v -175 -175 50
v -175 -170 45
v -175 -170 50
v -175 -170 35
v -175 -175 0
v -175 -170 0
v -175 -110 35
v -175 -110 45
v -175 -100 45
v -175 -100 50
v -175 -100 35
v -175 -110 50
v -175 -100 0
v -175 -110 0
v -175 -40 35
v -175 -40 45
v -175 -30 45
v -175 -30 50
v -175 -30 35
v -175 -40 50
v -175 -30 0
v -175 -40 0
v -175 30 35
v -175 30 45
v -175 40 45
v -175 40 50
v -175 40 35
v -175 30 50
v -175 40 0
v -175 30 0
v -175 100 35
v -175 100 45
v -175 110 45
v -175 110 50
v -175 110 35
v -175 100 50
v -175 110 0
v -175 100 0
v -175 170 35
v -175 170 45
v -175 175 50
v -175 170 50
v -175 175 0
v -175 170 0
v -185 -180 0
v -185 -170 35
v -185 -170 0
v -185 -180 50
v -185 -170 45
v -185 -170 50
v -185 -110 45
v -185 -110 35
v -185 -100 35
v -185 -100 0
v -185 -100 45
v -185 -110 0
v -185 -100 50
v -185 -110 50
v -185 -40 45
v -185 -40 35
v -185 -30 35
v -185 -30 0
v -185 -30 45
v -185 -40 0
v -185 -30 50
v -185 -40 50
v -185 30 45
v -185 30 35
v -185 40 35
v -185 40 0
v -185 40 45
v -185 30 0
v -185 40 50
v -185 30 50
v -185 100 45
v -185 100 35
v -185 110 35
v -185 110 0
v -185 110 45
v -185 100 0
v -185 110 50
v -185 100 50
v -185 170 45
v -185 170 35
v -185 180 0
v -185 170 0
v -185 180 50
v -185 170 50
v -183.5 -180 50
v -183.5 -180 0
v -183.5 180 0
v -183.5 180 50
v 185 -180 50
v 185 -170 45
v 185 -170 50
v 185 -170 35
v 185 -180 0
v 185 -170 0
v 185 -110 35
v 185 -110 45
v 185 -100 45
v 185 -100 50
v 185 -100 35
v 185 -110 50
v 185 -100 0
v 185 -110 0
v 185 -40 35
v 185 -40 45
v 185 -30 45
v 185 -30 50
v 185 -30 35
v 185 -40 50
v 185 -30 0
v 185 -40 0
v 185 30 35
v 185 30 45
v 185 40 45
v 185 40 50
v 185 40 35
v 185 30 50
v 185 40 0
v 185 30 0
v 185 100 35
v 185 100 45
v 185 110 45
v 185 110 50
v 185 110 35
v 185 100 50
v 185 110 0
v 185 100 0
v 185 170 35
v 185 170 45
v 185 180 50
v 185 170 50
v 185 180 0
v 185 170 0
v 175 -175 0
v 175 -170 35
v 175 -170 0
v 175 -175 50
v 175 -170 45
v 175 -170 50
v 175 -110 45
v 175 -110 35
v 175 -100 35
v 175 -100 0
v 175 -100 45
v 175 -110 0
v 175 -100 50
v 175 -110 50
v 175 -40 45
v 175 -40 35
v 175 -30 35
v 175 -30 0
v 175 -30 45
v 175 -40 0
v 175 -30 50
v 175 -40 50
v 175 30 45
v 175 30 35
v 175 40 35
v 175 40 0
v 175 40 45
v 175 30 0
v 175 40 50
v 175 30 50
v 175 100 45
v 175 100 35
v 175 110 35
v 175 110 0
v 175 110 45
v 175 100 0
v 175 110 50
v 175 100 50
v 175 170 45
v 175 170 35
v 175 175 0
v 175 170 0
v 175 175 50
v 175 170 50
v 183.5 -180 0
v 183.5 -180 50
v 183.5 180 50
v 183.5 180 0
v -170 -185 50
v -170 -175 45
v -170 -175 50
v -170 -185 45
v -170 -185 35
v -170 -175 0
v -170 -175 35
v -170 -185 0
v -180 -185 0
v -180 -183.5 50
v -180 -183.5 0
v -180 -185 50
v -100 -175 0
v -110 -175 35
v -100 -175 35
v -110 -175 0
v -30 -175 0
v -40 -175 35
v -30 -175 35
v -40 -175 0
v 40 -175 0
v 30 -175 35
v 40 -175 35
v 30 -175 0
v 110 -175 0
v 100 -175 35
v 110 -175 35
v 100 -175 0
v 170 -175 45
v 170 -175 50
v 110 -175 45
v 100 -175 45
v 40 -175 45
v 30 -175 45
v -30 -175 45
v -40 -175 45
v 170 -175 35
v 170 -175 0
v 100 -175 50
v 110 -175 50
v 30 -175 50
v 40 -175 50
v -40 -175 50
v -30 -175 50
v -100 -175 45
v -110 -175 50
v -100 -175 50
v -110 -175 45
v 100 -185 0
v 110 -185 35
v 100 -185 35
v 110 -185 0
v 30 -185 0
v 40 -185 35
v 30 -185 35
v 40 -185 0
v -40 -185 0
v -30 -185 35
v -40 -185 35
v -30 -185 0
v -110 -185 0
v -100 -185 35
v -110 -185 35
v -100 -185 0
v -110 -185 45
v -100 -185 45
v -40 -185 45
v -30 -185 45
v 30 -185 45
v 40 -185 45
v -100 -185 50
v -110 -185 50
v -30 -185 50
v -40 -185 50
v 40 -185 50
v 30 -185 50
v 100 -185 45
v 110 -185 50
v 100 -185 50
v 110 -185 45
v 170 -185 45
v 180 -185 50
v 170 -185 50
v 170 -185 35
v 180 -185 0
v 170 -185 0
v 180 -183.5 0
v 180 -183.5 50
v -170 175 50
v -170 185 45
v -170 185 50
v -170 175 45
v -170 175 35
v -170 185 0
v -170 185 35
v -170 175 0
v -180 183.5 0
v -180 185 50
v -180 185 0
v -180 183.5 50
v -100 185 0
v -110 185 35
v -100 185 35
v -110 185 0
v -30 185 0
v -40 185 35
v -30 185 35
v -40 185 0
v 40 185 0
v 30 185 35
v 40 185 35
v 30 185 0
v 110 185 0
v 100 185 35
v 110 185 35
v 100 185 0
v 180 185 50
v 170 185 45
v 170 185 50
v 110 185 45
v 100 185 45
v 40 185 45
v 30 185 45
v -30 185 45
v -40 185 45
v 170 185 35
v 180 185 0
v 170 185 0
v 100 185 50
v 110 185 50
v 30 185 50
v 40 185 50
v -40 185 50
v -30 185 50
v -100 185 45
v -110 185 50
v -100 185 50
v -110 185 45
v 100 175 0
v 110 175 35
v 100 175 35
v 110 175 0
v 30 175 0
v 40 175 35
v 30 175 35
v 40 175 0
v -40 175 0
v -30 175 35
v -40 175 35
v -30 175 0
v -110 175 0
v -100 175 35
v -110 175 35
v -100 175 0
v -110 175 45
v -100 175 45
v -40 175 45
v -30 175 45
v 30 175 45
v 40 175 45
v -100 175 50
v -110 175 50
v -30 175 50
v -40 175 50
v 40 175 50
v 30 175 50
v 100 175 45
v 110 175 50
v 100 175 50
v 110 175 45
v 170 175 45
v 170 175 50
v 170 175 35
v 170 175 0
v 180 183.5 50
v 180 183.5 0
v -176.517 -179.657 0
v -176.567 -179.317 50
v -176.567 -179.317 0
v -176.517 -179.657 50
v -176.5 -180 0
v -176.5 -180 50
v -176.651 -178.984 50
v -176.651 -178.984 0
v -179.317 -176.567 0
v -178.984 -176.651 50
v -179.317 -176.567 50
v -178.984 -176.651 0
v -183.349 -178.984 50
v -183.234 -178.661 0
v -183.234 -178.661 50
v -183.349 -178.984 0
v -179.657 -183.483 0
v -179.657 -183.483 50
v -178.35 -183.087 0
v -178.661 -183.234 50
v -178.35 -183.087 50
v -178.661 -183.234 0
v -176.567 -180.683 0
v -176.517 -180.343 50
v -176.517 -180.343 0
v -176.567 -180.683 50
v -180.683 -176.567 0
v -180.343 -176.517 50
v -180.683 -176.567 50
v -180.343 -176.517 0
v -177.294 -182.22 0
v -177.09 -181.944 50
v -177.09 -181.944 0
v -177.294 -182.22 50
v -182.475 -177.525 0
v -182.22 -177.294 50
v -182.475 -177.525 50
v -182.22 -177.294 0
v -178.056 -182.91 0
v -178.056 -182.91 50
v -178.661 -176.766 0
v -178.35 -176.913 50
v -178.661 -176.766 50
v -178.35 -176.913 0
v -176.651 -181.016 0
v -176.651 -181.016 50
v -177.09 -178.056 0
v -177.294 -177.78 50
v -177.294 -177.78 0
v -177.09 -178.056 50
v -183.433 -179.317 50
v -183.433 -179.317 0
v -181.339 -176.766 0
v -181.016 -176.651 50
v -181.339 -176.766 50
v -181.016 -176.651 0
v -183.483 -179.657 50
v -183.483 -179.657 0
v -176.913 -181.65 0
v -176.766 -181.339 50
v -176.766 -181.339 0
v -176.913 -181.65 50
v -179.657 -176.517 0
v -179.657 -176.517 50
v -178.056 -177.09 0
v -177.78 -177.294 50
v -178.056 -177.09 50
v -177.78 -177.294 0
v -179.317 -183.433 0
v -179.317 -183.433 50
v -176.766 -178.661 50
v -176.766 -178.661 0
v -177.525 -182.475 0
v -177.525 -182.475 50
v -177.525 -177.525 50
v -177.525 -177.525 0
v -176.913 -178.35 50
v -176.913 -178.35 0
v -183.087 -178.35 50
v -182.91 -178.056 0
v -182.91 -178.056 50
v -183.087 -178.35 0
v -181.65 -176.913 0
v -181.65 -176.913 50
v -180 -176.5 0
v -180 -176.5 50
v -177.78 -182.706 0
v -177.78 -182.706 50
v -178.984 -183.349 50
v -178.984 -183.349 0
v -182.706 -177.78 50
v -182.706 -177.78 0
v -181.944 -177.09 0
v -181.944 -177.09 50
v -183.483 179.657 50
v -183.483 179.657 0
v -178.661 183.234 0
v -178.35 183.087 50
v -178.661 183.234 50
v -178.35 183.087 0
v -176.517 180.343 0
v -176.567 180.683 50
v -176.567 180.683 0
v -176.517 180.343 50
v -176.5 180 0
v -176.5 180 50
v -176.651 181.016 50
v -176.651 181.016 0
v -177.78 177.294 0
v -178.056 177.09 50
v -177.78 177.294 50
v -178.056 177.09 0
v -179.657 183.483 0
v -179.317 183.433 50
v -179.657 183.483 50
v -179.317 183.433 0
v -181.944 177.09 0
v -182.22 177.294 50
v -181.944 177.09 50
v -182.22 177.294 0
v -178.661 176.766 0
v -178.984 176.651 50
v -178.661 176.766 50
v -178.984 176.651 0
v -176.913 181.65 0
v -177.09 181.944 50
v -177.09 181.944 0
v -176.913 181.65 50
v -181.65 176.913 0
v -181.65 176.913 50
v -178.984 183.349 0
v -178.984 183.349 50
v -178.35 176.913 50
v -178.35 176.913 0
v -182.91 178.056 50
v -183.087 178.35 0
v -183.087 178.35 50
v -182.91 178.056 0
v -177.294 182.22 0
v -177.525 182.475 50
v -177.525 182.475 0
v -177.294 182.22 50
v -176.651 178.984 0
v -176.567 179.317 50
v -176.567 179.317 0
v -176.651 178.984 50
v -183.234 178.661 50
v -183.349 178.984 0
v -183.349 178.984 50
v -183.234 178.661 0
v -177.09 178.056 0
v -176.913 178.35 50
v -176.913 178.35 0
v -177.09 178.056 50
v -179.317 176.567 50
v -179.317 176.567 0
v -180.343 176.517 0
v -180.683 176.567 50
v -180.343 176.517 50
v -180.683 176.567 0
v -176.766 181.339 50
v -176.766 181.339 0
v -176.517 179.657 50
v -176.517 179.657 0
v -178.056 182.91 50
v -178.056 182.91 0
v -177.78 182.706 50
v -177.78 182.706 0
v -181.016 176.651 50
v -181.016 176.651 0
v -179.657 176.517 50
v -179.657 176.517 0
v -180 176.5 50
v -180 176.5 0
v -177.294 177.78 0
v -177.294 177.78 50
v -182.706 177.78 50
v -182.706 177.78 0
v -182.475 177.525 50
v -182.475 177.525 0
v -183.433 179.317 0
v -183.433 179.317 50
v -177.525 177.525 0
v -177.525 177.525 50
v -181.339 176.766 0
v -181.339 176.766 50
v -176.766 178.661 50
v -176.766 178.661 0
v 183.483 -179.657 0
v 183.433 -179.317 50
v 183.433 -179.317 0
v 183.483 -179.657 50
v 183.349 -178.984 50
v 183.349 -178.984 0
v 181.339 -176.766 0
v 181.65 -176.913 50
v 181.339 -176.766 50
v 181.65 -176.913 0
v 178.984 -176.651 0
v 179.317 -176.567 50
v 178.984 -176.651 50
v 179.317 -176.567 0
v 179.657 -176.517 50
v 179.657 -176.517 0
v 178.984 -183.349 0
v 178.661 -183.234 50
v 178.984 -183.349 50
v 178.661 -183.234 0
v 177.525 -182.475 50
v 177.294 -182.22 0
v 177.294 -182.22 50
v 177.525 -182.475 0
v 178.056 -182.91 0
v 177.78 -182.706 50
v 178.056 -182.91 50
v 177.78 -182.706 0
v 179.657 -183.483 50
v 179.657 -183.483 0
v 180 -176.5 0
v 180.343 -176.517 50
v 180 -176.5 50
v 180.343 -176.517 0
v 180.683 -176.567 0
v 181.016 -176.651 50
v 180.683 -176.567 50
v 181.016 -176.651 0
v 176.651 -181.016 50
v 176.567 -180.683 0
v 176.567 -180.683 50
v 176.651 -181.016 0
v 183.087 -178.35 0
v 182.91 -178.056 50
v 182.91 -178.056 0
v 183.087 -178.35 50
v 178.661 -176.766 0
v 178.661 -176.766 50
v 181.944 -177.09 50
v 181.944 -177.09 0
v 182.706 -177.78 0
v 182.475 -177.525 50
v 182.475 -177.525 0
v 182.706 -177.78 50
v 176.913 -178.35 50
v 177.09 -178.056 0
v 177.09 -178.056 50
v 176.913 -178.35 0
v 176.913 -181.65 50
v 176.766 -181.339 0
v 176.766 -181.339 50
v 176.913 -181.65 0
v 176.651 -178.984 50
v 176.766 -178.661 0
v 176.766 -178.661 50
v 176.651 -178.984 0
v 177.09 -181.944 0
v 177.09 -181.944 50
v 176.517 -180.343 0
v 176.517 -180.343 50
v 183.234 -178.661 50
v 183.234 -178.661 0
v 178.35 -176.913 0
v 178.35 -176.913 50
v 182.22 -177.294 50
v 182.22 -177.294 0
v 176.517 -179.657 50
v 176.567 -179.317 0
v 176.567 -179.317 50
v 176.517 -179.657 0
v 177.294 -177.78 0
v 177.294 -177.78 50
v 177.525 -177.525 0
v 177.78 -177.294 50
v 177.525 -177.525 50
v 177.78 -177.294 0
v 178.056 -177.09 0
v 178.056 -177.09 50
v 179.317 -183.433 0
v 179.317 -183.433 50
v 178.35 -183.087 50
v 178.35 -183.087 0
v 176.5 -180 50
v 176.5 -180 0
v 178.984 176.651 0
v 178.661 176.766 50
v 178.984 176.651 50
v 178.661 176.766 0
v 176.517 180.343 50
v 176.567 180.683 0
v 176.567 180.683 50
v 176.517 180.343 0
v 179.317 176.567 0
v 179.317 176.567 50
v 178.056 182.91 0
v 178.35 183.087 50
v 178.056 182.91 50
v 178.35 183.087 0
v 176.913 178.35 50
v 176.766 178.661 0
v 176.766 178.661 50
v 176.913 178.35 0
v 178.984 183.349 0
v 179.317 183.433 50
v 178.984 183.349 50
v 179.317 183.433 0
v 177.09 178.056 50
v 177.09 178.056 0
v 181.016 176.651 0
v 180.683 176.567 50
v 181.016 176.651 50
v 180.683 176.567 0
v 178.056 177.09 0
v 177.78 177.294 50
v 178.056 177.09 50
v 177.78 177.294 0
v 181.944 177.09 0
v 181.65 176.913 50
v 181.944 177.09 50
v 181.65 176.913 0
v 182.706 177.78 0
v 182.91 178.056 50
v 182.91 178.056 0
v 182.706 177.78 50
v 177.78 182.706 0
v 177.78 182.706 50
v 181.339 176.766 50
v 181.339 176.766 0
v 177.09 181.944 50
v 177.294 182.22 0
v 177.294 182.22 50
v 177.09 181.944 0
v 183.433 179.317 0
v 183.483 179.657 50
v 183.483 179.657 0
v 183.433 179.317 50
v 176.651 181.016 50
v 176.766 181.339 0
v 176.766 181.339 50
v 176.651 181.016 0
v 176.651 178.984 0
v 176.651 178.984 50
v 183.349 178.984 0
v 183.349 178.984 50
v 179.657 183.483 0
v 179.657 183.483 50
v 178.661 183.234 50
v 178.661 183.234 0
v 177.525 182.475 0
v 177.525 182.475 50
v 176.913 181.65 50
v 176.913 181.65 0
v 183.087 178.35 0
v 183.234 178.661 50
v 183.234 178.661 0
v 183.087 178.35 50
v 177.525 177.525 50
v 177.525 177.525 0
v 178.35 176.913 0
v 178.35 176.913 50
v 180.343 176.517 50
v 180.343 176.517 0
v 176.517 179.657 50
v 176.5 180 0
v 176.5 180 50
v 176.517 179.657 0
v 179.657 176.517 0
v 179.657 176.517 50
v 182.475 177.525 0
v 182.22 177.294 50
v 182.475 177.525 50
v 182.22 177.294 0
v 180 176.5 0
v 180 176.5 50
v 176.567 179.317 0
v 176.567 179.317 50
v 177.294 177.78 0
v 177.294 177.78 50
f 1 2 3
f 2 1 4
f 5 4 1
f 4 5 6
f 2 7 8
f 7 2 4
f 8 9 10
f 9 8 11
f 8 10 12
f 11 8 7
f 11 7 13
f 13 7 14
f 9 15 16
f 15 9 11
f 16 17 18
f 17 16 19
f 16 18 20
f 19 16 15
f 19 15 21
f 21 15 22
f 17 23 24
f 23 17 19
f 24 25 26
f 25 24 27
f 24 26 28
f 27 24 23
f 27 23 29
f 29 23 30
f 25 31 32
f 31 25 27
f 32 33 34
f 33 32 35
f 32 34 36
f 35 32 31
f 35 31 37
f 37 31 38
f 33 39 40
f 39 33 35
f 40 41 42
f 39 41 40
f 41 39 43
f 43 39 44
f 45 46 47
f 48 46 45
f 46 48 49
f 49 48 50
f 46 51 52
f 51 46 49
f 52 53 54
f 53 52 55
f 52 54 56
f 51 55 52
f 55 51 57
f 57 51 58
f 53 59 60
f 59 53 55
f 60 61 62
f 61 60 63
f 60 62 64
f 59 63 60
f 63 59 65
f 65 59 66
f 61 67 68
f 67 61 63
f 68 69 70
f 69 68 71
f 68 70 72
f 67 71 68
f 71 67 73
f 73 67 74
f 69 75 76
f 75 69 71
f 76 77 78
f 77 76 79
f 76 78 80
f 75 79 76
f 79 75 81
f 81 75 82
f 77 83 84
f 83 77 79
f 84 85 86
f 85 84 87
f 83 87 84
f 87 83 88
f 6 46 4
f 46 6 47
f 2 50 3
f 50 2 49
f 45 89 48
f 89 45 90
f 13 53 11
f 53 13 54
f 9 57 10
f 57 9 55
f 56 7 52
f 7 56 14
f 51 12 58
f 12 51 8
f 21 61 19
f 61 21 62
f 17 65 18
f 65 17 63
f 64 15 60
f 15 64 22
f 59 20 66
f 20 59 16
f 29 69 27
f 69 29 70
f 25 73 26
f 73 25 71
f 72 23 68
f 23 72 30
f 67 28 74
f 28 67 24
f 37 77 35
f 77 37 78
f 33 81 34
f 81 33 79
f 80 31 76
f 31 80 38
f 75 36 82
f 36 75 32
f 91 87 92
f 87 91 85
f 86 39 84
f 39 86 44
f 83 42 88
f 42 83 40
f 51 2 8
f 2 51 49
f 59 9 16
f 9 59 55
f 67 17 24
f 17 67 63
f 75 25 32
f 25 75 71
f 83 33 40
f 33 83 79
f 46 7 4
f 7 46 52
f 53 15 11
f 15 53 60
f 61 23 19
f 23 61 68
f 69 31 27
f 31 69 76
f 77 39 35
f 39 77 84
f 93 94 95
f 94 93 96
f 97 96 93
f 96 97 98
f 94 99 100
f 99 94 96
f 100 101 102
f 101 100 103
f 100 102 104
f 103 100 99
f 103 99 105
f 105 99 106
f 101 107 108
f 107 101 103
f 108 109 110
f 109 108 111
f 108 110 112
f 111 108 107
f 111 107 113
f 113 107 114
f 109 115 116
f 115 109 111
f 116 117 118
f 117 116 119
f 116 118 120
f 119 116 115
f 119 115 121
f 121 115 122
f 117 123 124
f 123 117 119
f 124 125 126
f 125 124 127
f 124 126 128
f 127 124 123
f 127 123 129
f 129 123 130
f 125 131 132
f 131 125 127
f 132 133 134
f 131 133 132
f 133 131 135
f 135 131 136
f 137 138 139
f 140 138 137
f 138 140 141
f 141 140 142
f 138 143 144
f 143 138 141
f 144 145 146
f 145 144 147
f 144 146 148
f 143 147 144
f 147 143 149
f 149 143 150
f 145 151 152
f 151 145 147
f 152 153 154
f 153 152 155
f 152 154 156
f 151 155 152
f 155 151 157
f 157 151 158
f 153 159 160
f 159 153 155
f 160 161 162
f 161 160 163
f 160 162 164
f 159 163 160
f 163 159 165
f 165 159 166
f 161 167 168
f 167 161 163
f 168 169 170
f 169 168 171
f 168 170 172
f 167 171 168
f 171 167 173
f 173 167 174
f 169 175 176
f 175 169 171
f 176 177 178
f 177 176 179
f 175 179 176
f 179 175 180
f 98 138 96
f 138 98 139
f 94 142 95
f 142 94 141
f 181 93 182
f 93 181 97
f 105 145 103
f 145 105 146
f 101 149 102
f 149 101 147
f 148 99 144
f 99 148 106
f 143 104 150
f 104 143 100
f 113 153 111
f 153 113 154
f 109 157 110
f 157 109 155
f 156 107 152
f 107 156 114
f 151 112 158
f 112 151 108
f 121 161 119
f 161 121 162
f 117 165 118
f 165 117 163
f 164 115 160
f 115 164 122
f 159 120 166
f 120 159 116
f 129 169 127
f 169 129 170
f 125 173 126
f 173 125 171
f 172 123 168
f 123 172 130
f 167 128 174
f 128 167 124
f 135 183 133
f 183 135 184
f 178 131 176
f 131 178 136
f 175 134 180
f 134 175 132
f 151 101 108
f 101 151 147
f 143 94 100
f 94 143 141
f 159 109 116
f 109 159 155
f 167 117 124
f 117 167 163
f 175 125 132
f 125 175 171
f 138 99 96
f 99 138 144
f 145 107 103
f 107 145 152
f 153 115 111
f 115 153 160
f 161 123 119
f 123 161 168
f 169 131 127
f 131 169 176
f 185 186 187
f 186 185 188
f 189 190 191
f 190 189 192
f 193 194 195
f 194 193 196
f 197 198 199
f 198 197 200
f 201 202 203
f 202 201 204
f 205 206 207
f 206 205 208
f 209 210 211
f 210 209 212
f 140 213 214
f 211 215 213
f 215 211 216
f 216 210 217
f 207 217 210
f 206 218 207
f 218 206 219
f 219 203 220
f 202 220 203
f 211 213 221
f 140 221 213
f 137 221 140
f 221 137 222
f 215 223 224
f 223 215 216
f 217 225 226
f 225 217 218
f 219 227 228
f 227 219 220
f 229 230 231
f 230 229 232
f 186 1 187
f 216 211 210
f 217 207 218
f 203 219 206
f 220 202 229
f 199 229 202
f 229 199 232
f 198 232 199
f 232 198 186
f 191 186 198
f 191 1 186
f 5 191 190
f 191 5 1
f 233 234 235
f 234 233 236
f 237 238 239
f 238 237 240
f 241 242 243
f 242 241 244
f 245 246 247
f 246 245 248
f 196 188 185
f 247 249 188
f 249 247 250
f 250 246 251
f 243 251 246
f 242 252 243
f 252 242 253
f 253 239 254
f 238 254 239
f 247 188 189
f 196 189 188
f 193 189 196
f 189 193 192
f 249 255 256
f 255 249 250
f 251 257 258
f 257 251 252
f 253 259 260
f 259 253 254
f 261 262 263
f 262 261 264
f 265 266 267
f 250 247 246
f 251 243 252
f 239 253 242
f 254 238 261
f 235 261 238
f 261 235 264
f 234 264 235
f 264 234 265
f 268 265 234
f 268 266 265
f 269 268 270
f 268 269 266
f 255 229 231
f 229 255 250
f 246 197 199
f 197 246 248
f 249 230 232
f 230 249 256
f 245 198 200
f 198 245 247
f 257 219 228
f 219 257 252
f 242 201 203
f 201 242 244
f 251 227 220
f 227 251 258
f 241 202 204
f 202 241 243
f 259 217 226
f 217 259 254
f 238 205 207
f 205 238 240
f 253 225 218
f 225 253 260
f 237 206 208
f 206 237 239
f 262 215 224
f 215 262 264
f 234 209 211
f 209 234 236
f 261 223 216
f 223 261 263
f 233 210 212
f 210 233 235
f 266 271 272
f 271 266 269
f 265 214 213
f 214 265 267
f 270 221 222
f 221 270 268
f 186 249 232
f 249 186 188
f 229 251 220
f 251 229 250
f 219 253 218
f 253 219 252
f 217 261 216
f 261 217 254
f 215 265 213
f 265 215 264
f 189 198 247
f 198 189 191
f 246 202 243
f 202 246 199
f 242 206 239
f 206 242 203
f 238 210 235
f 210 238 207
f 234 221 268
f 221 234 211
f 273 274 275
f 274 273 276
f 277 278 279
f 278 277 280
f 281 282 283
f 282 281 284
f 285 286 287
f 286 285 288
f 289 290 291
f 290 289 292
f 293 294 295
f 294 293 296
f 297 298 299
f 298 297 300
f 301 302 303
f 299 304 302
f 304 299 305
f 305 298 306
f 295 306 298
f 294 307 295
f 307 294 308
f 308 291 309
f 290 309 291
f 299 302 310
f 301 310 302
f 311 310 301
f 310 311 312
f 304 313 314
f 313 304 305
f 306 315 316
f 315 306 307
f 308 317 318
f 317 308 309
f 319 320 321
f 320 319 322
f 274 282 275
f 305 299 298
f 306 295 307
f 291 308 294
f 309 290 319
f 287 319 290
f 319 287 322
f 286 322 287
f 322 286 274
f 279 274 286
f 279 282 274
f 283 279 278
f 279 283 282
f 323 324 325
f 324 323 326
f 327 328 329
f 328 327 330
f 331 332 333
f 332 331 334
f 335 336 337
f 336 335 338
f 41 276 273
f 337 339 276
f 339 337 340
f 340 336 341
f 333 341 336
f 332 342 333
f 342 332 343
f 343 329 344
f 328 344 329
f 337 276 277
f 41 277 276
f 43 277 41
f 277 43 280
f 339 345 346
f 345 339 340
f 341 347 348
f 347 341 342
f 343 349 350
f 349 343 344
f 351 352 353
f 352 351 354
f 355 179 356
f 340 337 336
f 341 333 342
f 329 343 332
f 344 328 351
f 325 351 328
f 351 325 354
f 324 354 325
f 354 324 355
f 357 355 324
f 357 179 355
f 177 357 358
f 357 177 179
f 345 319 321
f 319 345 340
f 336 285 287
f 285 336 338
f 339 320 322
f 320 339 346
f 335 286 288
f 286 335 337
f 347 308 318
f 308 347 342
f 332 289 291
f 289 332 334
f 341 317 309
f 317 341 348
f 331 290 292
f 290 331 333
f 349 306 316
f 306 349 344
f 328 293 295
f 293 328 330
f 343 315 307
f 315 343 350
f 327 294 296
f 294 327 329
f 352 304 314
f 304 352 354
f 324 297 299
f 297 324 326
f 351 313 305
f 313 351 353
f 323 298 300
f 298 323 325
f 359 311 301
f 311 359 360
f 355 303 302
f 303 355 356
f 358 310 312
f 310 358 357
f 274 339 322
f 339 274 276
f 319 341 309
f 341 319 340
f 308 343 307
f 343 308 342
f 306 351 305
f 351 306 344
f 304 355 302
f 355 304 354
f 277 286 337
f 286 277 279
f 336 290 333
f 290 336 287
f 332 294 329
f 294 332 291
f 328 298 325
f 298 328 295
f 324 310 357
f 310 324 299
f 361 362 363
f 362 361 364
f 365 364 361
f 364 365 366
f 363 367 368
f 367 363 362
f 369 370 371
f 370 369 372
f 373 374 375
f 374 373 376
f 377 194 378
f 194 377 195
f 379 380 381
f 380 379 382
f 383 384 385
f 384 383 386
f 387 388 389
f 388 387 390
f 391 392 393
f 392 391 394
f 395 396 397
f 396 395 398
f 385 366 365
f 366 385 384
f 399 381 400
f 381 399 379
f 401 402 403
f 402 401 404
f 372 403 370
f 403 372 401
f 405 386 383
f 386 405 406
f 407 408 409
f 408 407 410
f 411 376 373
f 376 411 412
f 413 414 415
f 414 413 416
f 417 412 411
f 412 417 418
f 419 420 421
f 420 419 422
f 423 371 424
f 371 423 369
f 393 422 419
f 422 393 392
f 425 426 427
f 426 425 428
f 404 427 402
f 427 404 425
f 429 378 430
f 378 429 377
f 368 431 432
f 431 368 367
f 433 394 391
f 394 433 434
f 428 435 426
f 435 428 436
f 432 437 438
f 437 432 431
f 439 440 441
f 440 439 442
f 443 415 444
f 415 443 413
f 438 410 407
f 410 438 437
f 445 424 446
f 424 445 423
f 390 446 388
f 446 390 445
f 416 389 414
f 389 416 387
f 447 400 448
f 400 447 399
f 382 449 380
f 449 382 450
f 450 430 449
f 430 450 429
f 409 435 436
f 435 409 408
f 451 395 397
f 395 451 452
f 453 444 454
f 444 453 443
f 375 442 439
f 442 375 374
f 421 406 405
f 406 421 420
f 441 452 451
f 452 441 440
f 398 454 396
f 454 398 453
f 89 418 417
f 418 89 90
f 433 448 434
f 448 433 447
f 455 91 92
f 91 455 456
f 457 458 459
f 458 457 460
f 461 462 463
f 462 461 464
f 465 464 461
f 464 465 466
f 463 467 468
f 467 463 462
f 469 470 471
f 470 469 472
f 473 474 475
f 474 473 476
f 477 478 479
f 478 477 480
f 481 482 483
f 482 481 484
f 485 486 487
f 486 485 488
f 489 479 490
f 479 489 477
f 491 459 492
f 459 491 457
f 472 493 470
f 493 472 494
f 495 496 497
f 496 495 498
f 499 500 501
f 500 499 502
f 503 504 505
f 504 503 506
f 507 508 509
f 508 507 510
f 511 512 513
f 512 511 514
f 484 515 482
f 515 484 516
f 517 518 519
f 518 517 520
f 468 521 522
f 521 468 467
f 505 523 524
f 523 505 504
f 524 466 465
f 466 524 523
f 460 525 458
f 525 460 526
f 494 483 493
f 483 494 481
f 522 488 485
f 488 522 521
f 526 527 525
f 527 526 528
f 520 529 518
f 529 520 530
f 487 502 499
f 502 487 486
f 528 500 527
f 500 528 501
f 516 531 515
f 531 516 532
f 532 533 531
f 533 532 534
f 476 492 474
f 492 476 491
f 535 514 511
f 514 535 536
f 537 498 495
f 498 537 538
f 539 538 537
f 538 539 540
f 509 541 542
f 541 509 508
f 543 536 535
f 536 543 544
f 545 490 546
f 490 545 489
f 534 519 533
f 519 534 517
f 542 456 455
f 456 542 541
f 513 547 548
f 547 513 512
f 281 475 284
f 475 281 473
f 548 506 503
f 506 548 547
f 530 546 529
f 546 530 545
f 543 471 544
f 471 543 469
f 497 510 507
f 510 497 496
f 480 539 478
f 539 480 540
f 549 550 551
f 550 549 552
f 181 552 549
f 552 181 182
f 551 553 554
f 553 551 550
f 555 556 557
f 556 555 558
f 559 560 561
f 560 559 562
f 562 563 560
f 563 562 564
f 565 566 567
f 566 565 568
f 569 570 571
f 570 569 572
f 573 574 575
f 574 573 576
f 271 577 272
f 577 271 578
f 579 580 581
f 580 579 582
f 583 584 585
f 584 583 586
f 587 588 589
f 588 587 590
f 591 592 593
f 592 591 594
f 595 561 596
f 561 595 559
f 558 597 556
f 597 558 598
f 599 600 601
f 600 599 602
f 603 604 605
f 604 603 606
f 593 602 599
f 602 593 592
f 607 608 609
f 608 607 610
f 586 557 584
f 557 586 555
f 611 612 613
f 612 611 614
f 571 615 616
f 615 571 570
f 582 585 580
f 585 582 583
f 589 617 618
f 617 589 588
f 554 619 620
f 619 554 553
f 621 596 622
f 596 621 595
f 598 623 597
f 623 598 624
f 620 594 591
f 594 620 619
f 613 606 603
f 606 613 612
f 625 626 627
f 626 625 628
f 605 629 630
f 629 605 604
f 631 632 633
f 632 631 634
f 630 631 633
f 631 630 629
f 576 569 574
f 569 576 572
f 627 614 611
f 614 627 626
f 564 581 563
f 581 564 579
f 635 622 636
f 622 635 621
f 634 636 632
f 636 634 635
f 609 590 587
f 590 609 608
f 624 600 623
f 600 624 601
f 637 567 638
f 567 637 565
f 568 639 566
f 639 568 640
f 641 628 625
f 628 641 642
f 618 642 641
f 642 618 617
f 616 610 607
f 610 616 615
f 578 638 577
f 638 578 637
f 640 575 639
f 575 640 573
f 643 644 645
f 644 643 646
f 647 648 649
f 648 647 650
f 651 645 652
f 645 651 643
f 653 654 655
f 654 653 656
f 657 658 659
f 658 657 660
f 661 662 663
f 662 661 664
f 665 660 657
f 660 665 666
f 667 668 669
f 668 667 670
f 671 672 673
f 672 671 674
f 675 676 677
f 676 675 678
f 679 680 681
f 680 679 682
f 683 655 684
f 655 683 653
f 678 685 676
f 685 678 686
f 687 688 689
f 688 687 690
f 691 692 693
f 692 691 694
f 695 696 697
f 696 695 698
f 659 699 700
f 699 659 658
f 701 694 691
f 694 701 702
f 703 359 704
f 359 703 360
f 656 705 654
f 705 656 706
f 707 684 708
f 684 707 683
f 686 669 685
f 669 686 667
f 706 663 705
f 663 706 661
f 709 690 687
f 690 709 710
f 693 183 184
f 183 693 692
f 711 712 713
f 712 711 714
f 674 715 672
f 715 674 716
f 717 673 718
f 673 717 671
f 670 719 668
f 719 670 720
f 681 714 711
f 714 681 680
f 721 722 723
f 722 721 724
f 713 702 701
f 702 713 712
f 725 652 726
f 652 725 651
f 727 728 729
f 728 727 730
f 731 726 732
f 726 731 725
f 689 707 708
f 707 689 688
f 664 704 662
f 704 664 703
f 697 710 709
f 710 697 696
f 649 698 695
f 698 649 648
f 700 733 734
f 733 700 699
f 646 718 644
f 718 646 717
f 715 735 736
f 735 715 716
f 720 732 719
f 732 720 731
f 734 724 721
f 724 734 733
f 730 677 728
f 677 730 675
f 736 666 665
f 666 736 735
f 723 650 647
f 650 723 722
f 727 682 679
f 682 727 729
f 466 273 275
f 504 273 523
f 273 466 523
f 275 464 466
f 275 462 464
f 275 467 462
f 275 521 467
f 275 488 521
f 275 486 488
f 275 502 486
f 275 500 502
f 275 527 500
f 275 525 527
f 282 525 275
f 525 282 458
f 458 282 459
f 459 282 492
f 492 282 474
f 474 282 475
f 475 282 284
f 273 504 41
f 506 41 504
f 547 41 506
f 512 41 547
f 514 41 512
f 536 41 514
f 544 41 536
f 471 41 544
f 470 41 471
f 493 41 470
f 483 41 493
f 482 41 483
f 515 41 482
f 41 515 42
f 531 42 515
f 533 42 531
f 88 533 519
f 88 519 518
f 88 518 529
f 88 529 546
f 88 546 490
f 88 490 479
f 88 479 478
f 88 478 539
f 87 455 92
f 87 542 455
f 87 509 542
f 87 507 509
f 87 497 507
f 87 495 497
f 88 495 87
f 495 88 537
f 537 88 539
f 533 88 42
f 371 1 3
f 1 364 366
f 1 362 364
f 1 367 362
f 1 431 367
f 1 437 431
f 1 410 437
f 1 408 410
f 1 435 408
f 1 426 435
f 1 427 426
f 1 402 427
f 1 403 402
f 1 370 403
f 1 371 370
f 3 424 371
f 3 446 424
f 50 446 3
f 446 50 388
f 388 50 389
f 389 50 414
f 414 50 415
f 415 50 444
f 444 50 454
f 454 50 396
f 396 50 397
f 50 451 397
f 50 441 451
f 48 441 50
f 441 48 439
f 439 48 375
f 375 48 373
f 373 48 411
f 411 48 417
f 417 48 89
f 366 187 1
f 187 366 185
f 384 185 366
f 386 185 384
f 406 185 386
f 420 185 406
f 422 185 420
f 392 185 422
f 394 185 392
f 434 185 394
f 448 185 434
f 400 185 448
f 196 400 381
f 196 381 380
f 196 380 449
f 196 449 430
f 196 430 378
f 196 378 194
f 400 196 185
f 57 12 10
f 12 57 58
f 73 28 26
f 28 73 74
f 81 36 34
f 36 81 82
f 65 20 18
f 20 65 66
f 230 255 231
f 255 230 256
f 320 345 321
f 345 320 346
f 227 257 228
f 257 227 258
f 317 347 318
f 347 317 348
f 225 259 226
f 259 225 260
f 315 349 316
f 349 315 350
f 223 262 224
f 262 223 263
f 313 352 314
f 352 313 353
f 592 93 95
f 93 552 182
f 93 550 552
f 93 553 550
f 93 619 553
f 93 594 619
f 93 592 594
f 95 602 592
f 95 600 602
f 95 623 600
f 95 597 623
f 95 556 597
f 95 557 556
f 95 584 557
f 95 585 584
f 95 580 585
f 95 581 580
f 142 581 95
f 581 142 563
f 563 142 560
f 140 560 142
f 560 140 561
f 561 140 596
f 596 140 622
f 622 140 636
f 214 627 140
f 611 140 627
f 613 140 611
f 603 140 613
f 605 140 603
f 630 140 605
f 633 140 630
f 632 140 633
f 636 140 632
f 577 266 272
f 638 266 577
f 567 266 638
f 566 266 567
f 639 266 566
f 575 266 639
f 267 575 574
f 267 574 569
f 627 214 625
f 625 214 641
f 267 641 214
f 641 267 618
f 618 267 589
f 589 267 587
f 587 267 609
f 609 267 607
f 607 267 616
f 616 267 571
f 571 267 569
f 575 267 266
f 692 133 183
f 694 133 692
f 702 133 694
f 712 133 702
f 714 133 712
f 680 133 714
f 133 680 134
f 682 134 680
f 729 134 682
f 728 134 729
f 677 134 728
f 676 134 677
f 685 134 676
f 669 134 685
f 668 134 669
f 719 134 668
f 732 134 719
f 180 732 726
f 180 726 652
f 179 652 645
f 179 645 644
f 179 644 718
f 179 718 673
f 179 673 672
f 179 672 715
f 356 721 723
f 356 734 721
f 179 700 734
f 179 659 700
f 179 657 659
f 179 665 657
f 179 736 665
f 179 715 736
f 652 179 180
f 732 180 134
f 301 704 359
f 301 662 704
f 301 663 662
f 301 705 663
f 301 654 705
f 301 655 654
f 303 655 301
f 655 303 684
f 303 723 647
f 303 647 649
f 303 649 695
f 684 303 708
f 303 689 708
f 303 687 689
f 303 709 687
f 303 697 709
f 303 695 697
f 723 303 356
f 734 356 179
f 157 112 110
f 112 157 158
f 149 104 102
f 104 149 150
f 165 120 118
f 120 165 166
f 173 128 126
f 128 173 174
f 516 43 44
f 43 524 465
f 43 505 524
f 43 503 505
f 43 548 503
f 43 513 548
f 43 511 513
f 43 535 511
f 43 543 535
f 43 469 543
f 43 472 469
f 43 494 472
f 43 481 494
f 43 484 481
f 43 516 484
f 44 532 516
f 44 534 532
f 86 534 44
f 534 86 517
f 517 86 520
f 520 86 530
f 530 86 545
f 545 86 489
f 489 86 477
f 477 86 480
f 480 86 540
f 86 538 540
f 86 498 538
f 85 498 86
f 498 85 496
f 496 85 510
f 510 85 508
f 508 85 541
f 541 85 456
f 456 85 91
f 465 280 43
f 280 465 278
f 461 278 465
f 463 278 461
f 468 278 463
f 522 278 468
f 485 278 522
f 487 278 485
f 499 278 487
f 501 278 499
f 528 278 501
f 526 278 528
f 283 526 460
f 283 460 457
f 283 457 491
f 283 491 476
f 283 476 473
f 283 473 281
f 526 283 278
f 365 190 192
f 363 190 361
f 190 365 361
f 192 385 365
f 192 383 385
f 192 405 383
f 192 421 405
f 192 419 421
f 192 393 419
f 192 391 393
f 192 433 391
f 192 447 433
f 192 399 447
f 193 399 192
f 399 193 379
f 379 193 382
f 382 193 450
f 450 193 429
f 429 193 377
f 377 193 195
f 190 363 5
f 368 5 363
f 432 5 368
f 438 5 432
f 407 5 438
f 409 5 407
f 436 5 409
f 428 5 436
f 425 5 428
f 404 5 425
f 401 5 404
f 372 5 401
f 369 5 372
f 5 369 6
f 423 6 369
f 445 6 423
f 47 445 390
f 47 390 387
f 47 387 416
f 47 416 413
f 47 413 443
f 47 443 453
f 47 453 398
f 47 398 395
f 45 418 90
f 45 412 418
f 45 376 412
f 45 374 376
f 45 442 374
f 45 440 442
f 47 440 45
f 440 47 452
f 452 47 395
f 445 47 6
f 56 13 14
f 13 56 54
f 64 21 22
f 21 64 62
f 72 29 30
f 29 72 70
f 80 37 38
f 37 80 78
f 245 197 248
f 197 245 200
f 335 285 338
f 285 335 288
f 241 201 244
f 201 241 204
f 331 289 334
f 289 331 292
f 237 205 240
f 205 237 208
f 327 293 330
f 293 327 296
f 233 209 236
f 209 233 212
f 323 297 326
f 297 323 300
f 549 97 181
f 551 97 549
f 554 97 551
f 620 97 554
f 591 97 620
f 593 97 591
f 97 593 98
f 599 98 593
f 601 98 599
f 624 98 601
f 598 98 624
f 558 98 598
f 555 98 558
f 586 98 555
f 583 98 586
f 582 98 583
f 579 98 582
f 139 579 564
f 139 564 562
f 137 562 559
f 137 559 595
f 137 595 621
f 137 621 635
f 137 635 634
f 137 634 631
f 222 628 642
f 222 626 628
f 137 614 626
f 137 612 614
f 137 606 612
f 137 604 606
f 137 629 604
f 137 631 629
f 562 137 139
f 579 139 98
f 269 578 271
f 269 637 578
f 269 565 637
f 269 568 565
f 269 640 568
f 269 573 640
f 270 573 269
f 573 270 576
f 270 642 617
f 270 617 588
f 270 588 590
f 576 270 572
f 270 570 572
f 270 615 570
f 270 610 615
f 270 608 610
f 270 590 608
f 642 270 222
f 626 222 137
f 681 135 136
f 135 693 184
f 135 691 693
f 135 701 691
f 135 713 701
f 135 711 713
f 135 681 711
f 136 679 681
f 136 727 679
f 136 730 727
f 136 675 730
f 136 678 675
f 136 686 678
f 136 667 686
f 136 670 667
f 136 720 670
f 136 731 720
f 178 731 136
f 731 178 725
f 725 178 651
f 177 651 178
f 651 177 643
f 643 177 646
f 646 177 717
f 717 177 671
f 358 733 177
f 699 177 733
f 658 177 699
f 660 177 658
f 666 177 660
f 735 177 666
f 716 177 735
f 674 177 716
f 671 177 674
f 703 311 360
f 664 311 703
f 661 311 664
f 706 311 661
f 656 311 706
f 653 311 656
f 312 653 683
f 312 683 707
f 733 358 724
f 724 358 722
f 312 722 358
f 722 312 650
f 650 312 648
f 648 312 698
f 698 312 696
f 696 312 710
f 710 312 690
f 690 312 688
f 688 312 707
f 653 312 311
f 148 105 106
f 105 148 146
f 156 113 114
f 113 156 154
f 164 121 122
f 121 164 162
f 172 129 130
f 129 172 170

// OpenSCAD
/*
  Cage slice 13 of 15
*/

bar = 10;
half_inner = 175;
gap = 70;
rod_d = 7;
half_outer = half_inner + bar;

function grid_pos(n) = -half_inner + n * gap;

module cage_full() {
  difference() {
    union() {
      // Floor grid at z = -10 .. 0
      for (j = [0:5]) {
        y = grid_pos(j);
        translate([-half_inner, y - bar/2, -bar])
          cube([2*half_inner, bar, bar], center=false);
      }
      for (i = [0:5]) {
        x = grid_pos(i);
        translate([x - bar/2, -half_inner, -bar])
          cube([bar, 2*half_inner, bar], center=false);
      }

      // Roof grid at z = 700 .. 710
      for (j = [0:5]) {
        y = grid_pos(j);
        translate([-half_inner, y - bar/2, 700])
          cube([2*half_inner, bar, bar], center=false);
      }
      for (i = [0:5]) {
        x = grid_pos(i);
        translate([x - bar/2, -half_inner, 700])
          cube([bar, 2*half_inner, bar], center=false);
      }

      // Side walls at x = ±175
      for (side = [-1, 1]) {
        sx = side * half_inner;
        x0 = (side == 1) ? sx : sx - bar;
        for (j = [0:5]) {
          y = grid_pos(j);
          translate([x0, y - bar/2, 0])
            cube([bar, bar, 700], center=false);
        }
        for (k = [0:10]) {
          zc = 0 + k * gap;
          translate([x0, -half_inner, zc - bar/2])
            cube([bar, 2*half_inner, bar], center=false);
        }
      }

      // Front/back walls at y = ±175
      for (side = [-1, 1]) {
        sy = side * half_inner;
        y0 = (side == 1) ? sy : sy - bar;
        for (i = [0:5]) {
          x = grid_pos(i);
          translate([x - bar/2, y0, 0])
            cube([bar, bar, 700], center=false);
        }
        for (k = [0:10]) {
          zc = 0 + k * gap;
          translate([-half_inner, y0, zc - bar/2])
            cube([2*half_inner, bar, bar], center=false);
        }
      }
    }

    for (sx = [-1, 1], sy = [-1, 1]) {
      translate([sx * (half_inner + bar/2),
                 sy * (half_inner + bar/2),
                 -20])
        cylinder(d = rod_d, h = 740, $fn = 64);
    }
  }
}

z_min = 590;
z_max = 640;  // height 50 mm

module slice() {
  intersection() {
    cage_full();
    translate([-half_outer - 5, -half_outer - 5, z_min])
      cube([2*(half_outer + 5), 2*(half_outer + 5), z_max - z_min], center=false);
  }
}

translate([0, 0, -z_min])
  slice();
